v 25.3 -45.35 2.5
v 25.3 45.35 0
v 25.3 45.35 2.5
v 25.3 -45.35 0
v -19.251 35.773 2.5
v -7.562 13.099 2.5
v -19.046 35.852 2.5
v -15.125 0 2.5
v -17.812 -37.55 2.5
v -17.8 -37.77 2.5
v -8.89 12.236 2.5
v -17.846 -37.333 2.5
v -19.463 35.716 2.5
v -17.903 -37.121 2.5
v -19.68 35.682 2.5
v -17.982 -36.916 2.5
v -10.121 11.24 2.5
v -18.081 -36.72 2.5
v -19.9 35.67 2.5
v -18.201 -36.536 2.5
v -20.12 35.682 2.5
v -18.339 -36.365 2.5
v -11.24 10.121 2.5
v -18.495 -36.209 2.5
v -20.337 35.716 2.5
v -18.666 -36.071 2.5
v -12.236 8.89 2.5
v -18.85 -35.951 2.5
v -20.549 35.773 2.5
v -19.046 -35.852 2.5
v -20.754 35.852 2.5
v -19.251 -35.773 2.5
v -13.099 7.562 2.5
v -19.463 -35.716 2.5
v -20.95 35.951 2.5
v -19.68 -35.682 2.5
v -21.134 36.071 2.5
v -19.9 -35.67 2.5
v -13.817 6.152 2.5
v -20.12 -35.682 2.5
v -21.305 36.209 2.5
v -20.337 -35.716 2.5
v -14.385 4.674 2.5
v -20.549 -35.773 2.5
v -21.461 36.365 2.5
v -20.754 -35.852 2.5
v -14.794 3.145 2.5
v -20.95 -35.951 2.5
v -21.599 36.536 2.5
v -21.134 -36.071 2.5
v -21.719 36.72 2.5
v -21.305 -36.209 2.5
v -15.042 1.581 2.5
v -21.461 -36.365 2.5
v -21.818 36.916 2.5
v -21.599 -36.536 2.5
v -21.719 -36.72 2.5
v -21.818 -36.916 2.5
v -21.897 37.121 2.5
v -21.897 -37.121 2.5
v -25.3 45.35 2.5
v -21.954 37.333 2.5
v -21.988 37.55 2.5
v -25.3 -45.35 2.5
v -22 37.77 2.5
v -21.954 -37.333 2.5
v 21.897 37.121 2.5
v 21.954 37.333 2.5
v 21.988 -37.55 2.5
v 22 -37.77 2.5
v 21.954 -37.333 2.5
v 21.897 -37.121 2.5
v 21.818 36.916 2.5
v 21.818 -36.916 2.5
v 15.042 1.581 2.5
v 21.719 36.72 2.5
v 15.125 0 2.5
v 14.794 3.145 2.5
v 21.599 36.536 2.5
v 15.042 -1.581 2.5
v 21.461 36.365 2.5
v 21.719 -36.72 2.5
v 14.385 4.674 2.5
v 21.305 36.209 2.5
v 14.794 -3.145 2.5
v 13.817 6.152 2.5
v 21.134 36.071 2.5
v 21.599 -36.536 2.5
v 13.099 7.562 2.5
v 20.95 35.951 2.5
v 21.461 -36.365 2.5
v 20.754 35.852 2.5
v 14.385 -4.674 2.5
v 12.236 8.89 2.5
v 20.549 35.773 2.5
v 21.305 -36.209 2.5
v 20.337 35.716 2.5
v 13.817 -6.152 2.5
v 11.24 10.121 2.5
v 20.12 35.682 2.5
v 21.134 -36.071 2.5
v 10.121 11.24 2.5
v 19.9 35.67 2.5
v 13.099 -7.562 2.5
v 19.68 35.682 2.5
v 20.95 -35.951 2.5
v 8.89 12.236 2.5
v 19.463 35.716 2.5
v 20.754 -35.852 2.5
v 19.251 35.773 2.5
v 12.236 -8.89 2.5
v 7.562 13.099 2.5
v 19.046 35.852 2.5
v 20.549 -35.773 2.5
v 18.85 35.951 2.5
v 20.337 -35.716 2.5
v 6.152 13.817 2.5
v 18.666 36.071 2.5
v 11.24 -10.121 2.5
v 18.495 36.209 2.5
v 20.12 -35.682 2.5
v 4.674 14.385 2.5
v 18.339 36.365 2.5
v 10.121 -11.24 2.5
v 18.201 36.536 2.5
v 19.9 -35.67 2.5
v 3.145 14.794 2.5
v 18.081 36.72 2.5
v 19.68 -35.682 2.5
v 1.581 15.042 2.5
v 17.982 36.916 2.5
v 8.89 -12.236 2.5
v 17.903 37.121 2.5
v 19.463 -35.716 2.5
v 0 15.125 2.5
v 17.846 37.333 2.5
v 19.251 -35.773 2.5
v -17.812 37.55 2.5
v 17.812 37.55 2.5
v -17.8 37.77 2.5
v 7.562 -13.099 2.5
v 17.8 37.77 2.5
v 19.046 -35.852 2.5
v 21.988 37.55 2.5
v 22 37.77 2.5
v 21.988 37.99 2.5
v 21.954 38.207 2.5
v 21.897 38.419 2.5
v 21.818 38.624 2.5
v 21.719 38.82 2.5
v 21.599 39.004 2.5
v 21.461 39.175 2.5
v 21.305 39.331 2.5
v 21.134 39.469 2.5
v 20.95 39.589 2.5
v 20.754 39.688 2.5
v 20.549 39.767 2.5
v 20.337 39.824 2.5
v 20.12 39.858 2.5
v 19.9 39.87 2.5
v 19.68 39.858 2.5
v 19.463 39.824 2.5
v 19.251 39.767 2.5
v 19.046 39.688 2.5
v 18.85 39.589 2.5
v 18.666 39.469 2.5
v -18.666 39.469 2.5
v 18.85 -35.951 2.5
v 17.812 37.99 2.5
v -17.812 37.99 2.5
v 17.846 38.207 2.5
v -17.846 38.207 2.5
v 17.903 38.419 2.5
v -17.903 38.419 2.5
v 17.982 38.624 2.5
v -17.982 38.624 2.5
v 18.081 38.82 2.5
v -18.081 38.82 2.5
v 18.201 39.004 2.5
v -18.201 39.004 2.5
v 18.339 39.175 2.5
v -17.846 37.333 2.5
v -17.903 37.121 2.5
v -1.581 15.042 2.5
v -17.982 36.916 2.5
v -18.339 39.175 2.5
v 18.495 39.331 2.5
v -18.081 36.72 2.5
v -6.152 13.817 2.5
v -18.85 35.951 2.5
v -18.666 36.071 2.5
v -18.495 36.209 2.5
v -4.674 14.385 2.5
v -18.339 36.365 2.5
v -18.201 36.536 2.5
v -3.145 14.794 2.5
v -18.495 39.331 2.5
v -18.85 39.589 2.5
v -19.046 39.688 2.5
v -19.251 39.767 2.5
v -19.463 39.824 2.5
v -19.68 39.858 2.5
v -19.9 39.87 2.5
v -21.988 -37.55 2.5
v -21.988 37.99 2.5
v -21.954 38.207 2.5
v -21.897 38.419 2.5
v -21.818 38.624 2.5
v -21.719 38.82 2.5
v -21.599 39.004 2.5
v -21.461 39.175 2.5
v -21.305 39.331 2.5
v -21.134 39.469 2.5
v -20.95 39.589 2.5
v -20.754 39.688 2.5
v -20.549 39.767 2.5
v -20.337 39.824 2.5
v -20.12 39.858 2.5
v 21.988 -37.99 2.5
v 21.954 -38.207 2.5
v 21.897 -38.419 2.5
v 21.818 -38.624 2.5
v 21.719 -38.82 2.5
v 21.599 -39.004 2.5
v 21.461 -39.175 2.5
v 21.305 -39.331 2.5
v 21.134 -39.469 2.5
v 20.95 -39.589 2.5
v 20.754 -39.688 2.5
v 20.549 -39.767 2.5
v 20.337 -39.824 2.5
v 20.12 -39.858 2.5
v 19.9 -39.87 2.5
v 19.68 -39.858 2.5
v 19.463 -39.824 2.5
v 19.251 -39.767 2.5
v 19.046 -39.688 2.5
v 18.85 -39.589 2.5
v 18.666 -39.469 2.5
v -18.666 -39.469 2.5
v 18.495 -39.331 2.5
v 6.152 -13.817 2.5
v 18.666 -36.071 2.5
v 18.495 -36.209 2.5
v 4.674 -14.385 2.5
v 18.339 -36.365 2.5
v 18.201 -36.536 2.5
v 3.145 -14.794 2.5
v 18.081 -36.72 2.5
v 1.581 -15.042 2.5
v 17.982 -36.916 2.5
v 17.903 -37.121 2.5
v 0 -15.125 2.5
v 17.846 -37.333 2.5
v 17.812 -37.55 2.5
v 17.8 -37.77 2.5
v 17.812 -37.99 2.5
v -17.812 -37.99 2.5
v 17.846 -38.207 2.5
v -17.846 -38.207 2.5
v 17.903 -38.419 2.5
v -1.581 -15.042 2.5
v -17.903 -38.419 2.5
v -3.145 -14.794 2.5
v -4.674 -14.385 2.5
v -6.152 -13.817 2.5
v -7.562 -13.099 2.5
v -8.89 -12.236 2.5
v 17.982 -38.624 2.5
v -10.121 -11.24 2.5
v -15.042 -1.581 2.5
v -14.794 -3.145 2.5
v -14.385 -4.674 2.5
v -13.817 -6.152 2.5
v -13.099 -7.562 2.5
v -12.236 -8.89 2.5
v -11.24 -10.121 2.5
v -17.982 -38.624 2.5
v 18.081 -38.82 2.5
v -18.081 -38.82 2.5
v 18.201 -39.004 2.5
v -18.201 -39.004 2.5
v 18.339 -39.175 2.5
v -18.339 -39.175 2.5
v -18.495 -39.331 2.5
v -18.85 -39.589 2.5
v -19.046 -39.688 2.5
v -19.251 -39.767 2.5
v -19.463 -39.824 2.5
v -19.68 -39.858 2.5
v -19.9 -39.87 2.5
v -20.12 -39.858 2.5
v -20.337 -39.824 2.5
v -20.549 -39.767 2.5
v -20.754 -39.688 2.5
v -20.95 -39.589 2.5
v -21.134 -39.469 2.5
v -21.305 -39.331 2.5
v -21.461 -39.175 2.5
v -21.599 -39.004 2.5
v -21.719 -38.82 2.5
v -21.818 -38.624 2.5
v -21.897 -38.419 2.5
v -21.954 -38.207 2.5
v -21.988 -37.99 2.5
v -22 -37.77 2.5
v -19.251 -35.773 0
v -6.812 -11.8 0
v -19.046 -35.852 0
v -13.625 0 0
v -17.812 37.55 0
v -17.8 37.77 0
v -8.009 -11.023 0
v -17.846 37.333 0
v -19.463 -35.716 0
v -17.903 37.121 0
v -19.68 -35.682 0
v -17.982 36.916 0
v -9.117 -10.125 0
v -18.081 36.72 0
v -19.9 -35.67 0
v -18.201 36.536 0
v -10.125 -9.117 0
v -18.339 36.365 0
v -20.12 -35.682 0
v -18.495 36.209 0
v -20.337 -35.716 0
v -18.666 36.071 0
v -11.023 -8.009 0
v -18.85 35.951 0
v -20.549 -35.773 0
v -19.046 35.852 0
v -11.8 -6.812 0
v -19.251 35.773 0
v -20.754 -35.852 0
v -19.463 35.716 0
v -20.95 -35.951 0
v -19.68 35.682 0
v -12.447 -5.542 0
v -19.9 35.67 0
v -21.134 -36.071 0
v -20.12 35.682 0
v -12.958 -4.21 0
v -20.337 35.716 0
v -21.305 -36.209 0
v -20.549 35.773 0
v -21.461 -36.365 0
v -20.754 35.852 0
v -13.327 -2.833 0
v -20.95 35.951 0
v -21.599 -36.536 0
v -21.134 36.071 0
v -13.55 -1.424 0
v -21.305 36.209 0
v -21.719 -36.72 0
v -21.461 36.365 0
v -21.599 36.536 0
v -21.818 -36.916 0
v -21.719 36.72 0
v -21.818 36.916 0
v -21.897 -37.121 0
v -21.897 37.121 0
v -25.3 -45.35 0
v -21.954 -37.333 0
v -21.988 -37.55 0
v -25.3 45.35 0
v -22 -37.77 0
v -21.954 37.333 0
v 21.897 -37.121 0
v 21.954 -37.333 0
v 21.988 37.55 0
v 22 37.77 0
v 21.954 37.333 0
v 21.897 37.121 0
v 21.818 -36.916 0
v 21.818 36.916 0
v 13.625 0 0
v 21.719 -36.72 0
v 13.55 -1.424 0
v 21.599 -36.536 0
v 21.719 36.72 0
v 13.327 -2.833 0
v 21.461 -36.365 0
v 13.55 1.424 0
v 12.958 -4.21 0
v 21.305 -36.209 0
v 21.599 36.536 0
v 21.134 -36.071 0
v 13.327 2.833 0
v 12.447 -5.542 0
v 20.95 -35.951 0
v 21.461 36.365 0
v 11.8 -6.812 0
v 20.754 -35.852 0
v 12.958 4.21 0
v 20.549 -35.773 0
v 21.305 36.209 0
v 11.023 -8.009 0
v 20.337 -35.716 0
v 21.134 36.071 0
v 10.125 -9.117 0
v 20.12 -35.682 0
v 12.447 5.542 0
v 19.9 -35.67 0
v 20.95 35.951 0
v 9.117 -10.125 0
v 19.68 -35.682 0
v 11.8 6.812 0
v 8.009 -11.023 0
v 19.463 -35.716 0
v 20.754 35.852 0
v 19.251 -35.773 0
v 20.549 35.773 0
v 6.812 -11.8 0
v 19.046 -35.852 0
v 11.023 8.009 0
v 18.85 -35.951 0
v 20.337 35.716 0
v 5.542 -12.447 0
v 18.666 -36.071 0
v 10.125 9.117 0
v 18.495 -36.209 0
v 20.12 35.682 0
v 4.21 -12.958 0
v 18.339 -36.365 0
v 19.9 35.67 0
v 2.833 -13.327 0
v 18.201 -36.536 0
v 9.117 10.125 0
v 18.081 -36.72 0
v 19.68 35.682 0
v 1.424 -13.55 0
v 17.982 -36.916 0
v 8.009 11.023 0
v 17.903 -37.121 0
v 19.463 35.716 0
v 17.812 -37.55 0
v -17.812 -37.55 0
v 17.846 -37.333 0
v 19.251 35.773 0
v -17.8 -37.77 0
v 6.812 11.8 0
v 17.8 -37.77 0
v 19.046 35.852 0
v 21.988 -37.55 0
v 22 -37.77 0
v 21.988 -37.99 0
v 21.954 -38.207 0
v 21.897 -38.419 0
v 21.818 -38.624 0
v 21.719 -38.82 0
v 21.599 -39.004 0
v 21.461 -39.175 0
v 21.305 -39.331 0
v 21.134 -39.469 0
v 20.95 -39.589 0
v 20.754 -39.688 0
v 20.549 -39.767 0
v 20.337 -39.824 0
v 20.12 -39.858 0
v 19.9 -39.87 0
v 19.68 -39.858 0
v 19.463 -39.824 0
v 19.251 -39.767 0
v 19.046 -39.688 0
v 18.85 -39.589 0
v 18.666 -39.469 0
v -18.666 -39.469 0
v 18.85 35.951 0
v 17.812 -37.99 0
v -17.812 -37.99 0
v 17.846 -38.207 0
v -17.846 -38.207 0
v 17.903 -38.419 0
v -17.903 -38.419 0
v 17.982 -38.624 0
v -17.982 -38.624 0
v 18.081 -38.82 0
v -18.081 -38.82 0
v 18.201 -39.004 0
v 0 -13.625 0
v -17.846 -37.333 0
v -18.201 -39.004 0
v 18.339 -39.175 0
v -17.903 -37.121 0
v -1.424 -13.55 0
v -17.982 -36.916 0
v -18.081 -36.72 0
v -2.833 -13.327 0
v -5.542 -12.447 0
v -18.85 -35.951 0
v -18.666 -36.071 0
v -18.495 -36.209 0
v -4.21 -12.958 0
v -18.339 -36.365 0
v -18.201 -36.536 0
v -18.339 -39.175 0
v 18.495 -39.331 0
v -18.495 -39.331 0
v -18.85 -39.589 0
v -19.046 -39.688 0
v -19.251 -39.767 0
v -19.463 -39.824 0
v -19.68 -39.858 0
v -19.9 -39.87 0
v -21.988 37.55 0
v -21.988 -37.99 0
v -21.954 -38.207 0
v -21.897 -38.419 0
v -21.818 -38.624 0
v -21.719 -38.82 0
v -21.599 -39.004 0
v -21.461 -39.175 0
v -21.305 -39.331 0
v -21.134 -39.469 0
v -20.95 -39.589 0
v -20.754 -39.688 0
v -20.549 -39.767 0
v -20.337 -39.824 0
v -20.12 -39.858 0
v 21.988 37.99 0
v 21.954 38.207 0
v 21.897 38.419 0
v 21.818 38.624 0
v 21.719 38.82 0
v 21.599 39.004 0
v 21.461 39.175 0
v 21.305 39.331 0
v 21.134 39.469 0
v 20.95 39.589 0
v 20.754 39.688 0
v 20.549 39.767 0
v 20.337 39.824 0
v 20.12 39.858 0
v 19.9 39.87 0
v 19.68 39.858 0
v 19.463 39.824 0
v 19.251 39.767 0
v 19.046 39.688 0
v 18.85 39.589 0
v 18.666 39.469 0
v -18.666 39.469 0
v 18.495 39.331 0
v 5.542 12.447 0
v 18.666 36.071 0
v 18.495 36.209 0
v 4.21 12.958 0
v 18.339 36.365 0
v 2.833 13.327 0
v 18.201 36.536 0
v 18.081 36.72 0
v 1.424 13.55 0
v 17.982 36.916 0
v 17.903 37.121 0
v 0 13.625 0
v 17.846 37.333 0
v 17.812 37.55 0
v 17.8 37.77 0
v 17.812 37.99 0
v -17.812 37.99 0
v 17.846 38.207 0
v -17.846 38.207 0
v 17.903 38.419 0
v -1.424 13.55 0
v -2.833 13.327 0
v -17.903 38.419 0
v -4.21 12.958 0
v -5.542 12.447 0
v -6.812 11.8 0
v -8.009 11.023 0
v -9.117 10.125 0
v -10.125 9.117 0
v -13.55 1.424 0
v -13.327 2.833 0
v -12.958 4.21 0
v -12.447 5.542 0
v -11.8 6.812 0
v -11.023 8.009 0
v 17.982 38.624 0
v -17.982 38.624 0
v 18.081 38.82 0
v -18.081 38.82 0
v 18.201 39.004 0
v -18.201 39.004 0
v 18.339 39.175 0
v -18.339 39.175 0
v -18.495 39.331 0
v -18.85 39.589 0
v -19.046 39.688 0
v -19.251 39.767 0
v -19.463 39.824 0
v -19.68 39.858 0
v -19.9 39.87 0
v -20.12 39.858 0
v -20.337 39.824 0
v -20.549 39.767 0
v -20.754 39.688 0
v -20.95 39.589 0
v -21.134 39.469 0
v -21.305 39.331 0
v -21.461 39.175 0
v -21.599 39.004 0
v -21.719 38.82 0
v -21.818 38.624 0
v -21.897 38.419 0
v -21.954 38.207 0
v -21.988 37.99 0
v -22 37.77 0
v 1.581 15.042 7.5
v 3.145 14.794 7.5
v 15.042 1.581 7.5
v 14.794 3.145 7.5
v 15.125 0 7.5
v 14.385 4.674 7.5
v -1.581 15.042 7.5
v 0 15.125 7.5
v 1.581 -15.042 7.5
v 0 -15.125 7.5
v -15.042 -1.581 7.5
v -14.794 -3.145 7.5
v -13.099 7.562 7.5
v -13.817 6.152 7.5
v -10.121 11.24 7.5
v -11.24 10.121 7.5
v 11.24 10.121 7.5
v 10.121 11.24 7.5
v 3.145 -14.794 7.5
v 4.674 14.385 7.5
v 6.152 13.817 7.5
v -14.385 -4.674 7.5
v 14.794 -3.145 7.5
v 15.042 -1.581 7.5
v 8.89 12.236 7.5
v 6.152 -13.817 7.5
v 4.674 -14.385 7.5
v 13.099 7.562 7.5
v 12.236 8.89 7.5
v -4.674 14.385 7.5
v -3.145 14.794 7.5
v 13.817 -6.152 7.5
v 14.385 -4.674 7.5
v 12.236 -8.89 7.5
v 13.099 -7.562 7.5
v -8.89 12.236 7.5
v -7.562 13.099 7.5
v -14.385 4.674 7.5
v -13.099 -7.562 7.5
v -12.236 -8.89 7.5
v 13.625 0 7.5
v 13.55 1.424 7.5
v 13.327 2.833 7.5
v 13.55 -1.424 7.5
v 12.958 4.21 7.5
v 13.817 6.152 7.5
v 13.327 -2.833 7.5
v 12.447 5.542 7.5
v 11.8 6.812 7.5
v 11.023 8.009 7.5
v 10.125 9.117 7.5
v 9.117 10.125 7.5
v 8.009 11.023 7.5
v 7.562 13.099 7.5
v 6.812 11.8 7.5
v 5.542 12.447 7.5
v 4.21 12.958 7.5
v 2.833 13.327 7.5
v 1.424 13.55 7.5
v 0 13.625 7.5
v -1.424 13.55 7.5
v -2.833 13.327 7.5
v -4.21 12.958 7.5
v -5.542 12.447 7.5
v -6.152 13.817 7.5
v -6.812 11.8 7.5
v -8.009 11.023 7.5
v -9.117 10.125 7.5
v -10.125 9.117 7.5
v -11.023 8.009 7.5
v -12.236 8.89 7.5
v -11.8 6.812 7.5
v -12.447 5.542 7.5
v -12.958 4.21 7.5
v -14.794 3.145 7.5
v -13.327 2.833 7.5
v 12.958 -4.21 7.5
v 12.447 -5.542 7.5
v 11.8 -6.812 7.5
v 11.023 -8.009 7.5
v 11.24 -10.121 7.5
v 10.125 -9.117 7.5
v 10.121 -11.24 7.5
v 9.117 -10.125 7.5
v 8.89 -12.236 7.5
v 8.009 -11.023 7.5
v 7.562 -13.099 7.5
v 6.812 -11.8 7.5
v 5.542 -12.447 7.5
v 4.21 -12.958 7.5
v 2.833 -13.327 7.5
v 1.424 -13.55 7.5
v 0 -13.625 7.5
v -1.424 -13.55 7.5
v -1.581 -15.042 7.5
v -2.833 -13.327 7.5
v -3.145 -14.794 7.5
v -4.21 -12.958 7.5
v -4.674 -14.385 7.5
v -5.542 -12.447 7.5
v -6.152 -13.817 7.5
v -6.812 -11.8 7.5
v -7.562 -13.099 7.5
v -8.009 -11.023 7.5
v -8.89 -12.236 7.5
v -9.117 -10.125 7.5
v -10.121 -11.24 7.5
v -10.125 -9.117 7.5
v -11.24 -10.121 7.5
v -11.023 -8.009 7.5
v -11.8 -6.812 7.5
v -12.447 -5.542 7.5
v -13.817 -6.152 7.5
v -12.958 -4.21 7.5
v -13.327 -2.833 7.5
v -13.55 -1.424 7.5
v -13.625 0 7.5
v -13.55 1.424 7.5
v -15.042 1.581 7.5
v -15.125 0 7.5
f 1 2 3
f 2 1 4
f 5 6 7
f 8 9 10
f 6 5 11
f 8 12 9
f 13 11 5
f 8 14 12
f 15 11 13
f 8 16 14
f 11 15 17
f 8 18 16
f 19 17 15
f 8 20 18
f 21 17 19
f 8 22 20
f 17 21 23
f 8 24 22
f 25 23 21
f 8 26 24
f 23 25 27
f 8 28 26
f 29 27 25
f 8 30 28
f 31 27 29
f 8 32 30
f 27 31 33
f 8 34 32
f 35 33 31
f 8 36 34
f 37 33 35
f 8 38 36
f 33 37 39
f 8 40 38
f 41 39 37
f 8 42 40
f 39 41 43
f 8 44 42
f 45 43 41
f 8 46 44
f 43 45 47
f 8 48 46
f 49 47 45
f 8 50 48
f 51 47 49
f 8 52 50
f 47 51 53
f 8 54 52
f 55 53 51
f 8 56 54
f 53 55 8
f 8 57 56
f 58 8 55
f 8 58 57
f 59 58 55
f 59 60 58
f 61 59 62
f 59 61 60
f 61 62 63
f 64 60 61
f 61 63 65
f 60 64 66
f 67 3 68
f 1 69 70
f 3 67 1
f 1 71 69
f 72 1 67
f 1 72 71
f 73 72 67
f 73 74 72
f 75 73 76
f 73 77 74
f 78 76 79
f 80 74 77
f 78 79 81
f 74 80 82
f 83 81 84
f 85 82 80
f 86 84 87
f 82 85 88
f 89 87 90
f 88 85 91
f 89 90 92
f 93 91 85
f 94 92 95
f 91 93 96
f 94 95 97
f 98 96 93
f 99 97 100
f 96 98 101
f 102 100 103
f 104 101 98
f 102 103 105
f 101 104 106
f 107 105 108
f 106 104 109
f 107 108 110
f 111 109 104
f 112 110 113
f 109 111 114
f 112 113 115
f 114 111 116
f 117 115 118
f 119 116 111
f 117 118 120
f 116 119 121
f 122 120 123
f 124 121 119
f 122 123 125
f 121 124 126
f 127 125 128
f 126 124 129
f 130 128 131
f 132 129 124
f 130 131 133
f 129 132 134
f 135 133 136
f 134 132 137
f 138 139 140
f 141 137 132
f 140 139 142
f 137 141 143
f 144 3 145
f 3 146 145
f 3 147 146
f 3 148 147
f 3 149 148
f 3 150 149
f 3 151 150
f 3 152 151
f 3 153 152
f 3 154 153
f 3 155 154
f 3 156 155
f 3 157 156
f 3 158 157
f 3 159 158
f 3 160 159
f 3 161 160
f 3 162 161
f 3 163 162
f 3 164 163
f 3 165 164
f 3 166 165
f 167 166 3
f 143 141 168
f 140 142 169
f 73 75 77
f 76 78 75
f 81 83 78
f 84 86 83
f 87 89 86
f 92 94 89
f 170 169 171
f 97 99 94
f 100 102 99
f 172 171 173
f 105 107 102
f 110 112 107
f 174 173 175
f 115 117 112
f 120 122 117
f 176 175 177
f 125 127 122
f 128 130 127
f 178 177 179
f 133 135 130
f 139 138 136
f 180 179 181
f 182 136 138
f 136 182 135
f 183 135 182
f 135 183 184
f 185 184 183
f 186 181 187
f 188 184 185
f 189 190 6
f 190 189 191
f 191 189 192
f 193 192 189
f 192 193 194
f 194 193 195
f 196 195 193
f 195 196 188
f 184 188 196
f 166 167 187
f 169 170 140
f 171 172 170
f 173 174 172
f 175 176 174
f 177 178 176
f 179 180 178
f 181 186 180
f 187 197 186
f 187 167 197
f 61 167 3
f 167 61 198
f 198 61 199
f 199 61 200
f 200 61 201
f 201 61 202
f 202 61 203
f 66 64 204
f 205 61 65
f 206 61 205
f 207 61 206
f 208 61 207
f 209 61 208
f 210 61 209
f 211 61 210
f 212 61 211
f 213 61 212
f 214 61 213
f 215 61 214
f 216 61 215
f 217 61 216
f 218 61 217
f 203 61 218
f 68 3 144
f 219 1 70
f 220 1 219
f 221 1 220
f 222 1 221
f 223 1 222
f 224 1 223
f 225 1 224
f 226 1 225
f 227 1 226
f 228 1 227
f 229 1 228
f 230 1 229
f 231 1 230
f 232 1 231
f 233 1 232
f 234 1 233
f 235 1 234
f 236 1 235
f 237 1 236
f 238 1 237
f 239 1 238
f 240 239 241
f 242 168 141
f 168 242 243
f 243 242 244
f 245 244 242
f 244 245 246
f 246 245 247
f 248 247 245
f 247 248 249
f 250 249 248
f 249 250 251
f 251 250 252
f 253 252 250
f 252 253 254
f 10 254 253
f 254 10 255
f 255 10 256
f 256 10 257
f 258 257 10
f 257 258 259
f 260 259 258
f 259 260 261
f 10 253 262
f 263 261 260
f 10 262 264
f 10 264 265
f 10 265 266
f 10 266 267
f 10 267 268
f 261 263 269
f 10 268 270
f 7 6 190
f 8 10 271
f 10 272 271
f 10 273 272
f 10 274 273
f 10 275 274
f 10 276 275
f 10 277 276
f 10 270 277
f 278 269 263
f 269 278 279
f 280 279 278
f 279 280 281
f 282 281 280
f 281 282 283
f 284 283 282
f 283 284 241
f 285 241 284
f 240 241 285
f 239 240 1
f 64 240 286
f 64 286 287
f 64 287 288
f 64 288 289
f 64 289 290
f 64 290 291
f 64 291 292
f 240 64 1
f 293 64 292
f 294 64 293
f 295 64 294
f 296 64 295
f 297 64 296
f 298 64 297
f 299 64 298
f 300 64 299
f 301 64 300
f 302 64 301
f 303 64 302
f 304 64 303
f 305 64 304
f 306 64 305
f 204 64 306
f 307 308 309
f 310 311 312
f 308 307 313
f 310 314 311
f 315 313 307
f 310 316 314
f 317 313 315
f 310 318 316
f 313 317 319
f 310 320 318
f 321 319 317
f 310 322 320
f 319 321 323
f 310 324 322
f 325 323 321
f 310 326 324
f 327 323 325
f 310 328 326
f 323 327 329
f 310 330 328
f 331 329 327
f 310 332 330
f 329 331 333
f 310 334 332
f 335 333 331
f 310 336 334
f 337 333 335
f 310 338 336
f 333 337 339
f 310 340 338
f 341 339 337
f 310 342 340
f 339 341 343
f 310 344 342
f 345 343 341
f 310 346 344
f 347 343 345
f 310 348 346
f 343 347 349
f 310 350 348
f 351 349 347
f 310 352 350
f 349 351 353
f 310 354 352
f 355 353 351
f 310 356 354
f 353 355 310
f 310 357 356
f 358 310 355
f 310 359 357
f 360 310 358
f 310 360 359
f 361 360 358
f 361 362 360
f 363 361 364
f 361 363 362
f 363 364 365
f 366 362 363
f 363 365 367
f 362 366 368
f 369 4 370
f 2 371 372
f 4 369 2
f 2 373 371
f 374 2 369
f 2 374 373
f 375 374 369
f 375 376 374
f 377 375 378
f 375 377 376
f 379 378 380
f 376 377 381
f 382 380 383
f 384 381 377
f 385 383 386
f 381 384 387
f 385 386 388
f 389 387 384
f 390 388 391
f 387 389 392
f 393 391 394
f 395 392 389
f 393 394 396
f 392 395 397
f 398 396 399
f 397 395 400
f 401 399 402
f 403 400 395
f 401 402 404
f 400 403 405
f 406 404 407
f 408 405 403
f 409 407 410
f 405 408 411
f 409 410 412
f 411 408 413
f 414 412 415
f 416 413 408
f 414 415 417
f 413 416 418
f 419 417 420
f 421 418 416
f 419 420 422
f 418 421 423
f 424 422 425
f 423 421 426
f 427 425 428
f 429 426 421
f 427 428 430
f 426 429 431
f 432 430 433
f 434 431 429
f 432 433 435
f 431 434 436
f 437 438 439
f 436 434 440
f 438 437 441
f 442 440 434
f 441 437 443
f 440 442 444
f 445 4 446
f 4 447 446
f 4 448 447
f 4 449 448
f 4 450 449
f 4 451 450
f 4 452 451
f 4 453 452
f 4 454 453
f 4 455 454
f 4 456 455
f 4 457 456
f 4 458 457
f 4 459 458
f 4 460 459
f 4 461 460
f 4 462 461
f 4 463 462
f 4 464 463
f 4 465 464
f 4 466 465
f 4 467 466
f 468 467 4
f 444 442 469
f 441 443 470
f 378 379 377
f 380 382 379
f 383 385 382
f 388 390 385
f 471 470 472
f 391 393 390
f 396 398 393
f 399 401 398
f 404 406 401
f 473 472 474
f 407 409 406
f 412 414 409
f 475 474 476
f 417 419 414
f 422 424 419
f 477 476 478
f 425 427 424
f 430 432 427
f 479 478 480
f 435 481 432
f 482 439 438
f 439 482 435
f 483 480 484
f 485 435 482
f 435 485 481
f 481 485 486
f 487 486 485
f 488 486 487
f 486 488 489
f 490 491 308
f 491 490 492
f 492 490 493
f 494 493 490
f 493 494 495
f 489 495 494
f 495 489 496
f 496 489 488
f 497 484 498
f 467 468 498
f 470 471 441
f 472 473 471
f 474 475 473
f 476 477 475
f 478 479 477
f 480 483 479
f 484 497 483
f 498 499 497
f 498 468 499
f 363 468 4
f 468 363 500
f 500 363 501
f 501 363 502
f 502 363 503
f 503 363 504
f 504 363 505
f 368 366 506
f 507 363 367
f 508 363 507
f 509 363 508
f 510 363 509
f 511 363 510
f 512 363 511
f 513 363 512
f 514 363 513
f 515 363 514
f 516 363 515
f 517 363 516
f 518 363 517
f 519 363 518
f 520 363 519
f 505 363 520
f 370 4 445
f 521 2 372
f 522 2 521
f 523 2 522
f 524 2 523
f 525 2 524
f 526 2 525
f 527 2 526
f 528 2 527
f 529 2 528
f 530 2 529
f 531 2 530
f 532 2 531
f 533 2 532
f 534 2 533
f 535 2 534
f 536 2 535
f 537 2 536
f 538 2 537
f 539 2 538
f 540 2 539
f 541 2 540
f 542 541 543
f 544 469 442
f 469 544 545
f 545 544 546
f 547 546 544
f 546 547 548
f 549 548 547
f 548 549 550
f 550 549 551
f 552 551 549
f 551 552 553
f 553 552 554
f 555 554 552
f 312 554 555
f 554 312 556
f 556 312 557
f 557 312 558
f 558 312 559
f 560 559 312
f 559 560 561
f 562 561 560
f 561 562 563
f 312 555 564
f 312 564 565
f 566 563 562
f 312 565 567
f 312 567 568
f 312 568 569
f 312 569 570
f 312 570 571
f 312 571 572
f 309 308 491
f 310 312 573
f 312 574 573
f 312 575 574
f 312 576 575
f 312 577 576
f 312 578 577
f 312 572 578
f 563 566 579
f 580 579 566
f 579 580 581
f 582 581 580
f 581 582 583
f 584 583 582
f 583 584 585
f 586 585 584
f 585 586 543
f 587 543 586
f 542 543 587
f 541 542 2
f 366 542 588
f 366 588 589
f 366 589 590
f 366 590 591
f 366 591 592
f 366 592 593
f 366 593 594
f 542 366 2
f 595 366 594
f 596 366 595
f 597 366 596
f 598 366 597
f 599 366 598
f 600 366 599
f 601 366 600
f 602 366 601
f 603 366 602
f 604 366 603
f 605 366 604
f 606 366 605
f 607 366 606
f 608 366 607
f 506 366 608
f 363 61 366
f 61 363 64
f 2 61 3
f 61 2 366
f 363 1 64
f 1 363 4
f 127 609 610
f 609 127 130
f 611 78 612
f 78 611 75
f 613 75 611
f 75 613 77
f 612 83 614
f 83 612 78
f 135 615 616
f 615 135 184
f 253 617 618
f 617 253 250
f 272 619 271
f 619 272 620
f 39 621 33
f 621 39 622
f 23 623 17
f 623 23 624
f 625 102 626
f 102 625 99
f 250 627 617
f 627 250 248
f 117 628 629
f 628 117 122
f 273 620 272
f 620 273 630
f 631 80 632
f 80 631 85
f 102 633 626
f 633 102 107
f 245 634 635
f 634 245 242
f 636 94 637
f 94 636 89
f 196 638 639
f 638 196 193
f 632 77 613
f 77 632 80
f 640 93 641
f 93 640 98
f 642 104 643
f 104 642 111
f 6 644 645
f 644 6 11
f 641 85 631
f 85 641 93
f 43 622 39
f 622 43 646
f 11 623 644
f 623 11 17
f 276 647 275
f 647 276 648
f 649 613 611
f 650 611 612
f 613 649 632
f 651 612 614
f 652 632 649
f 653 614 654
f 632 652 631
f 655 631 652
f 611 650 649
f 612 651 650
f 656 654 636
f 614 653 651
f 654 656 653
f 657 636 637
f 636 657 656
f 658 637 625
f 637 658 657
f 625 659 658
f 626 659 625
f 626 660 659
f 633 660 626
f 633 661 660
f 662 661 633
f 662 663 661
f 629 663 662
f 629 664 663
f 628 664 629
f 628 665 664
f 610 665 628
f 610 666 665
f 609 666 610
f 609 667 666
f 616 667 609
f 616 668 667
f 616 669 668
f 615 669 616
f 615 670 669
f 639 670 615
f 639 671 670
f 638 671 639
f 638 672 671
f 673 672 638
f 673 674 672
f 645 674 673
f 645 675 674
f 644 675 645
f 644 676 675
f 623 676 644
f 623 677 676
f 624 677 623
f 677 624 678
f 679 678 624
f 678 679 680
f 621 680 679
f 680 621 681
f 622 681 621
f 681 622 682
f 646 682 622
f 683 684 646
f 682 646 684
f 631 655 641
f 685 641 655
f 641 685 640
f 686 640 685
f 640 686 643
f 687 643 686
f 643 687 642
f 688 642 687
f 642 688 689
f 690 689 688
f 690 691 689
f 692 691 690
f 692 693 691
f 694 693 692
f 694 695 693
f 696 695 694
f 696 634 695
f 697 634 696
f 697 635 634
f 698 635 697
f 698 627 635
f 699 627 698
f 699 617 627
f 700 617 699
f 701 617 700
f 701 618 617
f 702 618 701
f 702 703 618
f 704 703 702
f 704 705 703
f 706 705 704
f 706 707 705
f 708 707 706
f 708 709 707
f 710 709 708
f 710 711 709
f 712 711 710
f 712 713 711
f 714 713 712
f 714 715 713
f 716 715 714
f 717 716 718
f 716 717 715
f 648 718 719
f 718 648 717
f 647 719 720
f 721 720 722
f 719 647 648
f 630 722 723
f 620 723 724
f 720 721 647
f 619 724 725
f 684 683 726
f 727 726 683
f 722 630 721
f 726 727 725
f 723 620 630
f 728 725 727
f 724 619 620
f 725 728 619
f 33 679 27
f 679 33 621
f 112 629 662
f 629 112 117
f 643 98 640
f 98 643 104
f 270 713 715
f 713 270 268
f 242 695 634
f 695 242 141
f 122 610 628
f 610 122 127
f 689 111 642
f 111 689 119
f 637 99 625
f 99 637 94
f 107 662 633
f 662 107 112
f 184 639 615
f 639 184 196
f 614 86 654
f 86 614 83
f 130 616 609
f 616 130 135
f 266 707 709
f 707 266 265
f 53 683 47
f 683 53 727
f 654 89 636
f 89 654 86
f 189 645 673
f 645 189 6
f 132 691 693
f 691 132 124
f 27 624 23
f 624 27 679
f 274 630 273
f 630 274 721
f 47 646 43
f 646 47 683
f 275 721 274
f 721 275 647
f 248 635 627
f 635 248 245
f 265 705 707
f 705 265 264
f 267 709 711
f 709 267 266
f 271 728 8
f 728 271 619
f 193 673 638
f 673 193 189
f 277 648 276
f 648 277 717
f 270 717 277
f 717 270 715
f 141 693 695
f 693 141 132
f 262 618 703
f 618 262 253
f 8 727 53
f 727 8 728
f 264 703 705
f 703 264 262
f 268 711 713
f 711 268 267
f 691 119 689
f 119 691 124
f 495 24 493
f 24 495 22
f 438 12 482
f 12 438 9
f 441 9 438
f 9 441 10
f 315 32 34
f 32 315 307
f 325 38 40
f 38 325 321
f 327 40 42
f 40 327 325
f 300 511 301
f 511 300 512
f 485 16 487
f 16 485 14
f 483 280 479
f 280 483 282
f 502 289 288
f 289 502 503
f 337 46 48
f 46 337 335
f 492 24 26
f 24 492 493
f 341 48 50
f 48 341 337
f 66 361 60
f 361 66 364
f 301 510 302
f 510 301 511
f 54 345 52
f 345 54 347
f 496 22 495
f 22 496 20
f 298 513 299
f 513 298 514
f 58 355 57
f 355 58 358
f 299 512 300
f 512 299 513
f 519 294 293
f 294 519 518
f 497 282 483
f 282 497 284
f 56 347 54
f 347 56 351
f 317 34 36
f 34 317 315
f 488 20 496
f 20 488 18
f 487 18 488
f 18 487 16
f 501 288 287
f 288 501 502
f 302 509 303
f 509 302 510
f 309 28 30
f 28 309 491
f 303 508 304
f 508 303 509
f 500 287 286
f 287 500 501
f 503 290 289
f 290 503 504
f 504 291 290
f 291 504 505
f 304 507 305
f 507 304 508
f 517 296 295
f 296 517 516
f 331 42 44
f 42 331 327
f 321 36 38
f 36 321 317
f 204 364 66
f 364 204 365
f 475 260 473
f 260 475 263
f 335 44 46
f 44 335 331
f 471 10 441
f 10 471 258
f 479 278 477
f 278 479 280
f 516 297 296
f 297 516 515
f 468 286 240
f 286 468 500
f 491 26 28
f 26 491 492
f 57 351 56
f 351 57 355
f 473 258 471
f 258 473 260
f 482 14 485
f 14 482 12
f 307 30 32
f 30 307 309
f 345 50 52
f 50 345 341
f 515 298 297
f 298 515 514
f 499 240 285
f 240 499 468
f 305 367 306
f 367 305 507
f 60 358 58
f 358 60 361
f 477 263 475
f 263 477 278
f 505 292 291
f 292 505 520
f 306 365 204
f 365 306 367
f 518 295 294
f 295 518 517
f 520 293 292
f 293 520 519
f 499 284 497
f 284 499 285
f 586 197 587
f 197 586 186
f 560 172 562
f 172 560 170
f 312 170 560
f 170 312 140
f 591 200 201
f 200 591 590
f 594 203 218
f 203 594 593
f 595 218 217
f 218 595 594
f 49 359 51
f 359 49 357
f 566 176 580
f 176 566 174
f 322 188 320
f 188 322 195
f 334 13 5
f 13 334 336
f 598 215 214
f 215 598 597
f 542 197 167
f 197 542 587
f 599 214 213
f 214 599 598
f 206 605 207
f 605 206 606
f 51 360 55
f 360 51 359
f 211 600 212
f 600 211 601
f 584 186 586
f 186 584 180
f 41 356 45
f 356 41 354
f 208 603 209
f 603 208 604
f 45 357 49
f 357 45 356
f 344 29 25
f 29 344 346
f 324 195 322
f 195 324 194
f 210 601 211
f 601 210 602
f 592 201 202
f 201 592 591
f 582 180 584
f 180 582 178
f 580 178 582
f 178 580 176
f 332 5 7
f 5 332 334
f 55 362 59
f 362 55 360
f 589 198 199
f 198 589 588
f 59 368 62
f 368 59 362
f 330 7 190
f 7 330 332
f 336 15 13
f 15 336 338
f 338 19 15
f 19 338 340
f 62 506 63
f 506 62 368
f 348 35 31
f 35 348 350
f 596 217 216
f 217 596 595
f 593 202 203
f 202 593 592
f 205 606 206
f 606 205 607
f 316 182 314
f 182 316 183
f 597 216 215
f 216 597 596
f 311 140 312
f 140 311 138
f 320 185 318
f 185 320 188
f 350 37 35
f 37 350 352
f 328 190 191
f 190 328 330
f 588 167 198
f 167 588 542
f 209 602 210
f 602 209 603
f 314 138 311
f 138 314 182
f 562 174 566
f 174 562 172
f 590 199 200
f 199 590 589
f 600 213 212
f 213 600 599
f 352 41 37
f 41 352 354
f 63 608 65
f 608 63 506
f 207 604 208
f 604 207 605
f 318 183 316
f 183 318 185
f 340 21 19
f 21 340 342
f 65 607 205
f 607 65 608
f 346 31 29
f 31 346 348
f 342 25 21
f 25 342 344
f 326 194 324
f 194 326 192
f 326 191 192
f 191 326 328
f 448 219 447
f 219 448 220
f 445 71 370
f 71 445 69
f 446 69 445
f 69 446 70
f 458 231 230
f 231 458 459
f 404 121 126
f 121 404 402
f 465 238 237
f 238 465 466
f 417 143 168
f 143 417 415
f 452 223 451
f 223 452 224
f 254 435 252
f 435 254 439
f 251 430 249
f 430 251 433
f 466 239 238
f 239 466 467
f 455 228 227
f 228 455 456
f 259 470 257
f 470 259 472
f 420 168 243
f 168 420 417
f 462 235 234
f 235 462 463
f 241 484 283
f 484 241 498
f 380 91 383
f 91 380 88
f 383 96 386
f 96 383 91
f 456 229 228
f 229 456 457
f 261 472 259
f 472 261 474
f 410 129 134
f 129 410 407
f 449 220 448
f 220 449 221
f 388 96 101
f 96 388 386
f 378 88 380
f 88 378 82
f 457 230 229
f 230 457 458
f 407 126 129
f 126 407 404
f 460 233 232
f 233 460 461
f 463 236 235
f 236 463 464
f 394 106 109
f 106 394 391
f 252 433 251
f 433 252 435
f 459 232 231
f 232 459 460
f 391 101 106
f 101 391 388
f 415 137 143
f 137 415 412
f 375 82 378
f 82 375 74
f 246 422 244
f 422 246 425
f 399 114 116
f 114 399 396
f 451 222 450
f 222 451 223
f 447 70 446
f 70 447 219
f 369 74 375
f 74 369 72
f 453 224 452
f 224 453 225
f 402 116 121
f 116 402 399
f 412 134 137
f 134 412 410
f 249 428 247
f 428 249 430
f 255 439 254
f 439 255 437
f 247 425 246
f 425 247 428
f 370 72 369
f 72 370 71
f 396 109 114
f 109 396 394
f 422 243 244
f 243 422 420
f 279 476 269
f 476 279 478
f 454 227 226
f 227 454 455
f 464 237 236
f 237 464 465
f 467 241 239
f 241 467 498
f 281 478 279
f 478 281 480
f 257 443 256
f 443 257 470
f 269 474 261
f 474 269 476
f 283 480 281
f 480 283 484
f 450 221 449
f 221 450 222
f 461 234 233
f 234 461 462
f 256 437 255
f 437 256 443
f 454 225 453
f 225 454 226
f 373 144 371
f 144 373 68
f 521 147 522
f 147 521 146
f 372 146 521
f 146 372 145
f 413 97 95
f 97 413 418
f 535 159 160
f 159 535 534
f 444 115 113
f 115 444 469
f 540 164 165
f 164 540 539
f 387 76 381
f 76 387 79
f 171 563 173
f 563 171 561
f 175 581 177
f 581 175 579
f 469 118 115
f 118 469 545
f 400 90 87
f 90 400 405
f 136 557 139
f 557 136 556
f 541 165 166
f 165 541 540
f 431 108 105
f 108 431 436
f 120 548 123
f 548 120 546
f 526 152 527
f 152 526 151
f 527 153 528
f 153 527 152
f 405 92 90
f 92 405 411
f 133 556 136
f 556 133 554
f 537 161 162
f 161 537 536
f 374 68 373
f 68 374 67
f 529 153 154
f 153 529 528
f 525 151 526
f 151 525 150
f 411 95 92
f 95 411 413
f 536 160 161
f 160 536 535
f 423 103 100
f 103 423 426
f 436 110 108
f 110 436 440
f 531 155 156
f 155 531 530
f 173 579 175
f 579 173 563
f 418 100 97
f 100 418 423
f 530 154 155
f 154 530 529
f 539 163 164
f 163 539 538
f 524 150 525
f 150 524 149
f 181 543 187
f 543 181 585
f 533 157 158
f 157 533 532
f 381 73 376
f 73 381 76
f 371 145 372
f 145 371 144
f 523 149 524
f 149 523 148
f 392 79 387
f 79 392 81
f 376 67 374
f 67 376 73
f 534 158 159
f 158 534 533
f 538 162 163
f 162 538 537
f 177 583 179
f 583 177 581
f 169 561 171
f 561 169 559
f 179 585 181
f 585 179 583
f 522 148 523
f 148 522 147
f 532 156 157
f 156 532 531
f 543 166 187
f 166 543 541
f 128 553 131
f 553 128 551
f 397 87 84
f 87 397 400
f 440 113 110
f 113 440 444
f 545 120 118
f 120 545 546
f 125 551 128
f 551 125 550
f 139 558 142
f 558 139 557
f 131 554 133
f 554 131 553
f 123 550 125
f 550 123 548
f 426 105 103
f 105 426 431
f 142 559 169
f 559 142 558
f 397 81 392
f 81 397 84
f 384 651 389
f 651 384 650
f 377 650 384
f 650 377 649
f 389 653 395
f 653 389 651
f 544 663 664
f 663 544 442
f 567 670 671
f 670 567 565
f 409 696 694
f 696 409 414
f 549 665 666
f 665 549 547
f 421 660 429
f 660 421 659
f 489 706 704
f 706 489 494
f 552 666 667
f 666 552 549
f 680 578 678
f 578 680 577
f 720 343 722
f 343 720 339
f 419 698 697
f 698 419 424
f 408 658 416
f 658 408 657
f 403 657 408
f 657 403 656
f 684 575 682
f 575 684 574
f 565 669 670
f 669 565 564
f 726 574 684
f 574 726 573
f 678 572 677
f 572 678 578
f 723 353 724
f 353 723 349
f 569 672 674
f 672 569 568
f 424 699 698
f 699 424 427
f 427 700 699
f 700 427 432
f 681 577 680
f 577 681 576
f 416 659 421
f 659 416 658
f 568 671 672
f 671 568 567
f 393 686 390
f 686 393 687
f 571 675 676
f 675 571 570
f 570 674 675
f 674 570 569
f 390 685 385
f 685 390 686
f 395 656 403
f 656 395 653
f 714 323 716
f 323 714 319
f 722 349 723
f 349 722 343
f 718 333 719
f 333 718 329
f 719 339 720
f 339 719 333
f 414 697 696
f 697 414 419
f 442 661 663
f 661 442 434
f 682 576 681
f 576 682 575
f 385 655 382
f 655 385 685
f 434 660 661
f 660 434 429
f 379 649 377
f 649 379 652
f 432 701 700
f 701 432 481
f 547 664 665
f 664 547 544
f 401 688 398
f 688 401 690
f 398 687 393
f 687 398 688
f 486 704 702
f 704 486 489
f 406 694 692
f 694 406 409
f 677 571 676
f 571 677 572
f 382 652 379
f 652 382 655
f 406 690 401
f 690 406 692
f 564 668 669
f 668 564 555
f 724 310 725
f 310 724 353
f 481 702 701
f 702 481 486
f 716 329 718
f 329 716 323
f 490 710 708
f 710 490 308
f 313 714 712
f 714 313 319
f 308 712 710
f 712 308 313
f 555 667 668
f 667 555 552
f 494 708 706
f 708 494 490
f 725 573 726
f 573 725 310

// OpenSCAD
include <MCAD/units.scad>

$fn = 60;

height = 2.5;
rimRadius = 27.25 / 2;
rimHeight = 5;
width = 50.6;
length = 90.7;
padding = 24;
enclosureHoleInset=8;

module SpeakerMount() {
    difference() {
        union() {
            color("silver")
            translate([-width/2, -length/2, 0])
            cube([width, length, height]);

            cylinder(r=rimRadius+1.5, h=height+rimHeight);
        }
        
        translate([0, 0, -epsilon])
        cylinder(r=rimRadius, h=height+rimHeight+epsilon*2);

        // Speaker Holes
        for (x=[-1, 1], y=[-1, 1])
        translate([x * (width/2-(3.47+3.86/2)), y * (length/2-(4.65+5.86/2)), -epsilon])
        cylinder(r=2.1, h=height+epsilon*2);
    }
}

SpeakerMount();
